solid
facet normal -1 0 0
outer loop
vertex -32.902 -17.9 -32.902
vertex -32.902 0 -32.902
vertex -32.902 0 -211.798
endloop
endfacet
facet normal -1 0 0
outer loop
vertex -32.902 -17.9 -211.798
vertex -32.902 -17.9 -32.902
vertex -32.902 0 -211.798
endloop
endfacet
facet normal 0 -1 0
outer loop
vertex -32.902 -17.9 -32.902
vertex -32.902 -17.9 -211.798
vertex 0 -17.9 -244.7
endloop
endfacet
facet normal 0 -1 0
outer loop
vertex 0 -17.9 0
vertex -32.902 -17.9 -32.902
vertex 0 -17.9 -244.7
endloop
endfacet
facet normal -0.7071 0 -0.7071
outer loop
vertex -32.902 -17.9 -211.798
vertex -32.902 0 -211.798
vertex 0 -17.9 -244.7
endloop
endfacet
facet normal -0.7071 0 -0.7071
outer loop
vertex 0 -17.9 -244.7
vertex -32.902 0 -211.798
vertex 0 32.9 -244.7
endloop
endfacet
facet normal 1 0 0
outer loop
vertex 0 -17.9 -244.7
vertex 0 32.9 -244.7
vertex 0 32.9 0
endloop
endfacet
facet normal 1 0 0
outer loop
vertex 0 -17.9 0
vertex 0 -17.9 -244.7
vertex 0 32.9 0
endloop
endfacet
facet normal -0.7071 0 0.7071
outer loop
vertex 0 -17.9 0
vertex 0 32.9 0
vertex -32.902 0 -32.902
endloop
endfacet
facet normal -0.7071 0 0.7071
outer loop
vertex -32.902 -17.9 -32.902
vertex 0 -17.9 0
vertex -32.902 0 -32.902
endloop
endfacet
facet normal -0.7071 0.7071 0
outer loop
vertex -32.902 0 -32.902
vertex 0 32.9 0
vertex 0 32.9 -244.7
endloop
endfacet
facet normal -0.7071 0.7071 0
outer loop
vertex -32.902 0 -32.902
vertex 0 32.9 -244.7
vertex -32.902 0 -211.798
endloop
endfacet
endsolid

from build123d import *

# Parameters (mm, degrees)
BOSS_EXTRUDE1_DEPTH = 32.9
CUT_EXTRUDE1_DEPTH  = 275.9
BOSS_EXTRUDE2_DEPTH = 17.9


with BuildPart() as part:
    # Sketch1 → Boss-Extrude1 (new body)
    with BuildSketch(Plane(origin=(0, 0, 0), x_dir=(1, 0, 0), z_dir=(0, 1, 0))):
        Polygon((0, 244.7), (-32.901678529, 211.798321471), (-32.901678529, 32.901678529), (0, 0), align=None)
    extrude(amount=BOSS_EXTRUDE1_DEPTH)

    # Sketch2 → Cut-Extrude1 (cut)
    with BuildSketch(Plane.XY):
        Polygon((0, 32.9), (-32.901678529, 0), (-32.901678529, 32.9), align=None)
    extrude(amount=-CUT_EXTRUDE1_DEPTH, mode=Mode.SUBTRACT)

    # Sketch3 → Boss-Extrude2 (add)
    with BuildSketch(Plane.XZ):
        Polygon((0, 0), (-32.901678529, -32.901678529), (-32.901678529, -211.798321471), (0, -244.7), align=None)
    extrude(amount=BOSS_EXTRUDE2_DEPTH)


solid = part.part
